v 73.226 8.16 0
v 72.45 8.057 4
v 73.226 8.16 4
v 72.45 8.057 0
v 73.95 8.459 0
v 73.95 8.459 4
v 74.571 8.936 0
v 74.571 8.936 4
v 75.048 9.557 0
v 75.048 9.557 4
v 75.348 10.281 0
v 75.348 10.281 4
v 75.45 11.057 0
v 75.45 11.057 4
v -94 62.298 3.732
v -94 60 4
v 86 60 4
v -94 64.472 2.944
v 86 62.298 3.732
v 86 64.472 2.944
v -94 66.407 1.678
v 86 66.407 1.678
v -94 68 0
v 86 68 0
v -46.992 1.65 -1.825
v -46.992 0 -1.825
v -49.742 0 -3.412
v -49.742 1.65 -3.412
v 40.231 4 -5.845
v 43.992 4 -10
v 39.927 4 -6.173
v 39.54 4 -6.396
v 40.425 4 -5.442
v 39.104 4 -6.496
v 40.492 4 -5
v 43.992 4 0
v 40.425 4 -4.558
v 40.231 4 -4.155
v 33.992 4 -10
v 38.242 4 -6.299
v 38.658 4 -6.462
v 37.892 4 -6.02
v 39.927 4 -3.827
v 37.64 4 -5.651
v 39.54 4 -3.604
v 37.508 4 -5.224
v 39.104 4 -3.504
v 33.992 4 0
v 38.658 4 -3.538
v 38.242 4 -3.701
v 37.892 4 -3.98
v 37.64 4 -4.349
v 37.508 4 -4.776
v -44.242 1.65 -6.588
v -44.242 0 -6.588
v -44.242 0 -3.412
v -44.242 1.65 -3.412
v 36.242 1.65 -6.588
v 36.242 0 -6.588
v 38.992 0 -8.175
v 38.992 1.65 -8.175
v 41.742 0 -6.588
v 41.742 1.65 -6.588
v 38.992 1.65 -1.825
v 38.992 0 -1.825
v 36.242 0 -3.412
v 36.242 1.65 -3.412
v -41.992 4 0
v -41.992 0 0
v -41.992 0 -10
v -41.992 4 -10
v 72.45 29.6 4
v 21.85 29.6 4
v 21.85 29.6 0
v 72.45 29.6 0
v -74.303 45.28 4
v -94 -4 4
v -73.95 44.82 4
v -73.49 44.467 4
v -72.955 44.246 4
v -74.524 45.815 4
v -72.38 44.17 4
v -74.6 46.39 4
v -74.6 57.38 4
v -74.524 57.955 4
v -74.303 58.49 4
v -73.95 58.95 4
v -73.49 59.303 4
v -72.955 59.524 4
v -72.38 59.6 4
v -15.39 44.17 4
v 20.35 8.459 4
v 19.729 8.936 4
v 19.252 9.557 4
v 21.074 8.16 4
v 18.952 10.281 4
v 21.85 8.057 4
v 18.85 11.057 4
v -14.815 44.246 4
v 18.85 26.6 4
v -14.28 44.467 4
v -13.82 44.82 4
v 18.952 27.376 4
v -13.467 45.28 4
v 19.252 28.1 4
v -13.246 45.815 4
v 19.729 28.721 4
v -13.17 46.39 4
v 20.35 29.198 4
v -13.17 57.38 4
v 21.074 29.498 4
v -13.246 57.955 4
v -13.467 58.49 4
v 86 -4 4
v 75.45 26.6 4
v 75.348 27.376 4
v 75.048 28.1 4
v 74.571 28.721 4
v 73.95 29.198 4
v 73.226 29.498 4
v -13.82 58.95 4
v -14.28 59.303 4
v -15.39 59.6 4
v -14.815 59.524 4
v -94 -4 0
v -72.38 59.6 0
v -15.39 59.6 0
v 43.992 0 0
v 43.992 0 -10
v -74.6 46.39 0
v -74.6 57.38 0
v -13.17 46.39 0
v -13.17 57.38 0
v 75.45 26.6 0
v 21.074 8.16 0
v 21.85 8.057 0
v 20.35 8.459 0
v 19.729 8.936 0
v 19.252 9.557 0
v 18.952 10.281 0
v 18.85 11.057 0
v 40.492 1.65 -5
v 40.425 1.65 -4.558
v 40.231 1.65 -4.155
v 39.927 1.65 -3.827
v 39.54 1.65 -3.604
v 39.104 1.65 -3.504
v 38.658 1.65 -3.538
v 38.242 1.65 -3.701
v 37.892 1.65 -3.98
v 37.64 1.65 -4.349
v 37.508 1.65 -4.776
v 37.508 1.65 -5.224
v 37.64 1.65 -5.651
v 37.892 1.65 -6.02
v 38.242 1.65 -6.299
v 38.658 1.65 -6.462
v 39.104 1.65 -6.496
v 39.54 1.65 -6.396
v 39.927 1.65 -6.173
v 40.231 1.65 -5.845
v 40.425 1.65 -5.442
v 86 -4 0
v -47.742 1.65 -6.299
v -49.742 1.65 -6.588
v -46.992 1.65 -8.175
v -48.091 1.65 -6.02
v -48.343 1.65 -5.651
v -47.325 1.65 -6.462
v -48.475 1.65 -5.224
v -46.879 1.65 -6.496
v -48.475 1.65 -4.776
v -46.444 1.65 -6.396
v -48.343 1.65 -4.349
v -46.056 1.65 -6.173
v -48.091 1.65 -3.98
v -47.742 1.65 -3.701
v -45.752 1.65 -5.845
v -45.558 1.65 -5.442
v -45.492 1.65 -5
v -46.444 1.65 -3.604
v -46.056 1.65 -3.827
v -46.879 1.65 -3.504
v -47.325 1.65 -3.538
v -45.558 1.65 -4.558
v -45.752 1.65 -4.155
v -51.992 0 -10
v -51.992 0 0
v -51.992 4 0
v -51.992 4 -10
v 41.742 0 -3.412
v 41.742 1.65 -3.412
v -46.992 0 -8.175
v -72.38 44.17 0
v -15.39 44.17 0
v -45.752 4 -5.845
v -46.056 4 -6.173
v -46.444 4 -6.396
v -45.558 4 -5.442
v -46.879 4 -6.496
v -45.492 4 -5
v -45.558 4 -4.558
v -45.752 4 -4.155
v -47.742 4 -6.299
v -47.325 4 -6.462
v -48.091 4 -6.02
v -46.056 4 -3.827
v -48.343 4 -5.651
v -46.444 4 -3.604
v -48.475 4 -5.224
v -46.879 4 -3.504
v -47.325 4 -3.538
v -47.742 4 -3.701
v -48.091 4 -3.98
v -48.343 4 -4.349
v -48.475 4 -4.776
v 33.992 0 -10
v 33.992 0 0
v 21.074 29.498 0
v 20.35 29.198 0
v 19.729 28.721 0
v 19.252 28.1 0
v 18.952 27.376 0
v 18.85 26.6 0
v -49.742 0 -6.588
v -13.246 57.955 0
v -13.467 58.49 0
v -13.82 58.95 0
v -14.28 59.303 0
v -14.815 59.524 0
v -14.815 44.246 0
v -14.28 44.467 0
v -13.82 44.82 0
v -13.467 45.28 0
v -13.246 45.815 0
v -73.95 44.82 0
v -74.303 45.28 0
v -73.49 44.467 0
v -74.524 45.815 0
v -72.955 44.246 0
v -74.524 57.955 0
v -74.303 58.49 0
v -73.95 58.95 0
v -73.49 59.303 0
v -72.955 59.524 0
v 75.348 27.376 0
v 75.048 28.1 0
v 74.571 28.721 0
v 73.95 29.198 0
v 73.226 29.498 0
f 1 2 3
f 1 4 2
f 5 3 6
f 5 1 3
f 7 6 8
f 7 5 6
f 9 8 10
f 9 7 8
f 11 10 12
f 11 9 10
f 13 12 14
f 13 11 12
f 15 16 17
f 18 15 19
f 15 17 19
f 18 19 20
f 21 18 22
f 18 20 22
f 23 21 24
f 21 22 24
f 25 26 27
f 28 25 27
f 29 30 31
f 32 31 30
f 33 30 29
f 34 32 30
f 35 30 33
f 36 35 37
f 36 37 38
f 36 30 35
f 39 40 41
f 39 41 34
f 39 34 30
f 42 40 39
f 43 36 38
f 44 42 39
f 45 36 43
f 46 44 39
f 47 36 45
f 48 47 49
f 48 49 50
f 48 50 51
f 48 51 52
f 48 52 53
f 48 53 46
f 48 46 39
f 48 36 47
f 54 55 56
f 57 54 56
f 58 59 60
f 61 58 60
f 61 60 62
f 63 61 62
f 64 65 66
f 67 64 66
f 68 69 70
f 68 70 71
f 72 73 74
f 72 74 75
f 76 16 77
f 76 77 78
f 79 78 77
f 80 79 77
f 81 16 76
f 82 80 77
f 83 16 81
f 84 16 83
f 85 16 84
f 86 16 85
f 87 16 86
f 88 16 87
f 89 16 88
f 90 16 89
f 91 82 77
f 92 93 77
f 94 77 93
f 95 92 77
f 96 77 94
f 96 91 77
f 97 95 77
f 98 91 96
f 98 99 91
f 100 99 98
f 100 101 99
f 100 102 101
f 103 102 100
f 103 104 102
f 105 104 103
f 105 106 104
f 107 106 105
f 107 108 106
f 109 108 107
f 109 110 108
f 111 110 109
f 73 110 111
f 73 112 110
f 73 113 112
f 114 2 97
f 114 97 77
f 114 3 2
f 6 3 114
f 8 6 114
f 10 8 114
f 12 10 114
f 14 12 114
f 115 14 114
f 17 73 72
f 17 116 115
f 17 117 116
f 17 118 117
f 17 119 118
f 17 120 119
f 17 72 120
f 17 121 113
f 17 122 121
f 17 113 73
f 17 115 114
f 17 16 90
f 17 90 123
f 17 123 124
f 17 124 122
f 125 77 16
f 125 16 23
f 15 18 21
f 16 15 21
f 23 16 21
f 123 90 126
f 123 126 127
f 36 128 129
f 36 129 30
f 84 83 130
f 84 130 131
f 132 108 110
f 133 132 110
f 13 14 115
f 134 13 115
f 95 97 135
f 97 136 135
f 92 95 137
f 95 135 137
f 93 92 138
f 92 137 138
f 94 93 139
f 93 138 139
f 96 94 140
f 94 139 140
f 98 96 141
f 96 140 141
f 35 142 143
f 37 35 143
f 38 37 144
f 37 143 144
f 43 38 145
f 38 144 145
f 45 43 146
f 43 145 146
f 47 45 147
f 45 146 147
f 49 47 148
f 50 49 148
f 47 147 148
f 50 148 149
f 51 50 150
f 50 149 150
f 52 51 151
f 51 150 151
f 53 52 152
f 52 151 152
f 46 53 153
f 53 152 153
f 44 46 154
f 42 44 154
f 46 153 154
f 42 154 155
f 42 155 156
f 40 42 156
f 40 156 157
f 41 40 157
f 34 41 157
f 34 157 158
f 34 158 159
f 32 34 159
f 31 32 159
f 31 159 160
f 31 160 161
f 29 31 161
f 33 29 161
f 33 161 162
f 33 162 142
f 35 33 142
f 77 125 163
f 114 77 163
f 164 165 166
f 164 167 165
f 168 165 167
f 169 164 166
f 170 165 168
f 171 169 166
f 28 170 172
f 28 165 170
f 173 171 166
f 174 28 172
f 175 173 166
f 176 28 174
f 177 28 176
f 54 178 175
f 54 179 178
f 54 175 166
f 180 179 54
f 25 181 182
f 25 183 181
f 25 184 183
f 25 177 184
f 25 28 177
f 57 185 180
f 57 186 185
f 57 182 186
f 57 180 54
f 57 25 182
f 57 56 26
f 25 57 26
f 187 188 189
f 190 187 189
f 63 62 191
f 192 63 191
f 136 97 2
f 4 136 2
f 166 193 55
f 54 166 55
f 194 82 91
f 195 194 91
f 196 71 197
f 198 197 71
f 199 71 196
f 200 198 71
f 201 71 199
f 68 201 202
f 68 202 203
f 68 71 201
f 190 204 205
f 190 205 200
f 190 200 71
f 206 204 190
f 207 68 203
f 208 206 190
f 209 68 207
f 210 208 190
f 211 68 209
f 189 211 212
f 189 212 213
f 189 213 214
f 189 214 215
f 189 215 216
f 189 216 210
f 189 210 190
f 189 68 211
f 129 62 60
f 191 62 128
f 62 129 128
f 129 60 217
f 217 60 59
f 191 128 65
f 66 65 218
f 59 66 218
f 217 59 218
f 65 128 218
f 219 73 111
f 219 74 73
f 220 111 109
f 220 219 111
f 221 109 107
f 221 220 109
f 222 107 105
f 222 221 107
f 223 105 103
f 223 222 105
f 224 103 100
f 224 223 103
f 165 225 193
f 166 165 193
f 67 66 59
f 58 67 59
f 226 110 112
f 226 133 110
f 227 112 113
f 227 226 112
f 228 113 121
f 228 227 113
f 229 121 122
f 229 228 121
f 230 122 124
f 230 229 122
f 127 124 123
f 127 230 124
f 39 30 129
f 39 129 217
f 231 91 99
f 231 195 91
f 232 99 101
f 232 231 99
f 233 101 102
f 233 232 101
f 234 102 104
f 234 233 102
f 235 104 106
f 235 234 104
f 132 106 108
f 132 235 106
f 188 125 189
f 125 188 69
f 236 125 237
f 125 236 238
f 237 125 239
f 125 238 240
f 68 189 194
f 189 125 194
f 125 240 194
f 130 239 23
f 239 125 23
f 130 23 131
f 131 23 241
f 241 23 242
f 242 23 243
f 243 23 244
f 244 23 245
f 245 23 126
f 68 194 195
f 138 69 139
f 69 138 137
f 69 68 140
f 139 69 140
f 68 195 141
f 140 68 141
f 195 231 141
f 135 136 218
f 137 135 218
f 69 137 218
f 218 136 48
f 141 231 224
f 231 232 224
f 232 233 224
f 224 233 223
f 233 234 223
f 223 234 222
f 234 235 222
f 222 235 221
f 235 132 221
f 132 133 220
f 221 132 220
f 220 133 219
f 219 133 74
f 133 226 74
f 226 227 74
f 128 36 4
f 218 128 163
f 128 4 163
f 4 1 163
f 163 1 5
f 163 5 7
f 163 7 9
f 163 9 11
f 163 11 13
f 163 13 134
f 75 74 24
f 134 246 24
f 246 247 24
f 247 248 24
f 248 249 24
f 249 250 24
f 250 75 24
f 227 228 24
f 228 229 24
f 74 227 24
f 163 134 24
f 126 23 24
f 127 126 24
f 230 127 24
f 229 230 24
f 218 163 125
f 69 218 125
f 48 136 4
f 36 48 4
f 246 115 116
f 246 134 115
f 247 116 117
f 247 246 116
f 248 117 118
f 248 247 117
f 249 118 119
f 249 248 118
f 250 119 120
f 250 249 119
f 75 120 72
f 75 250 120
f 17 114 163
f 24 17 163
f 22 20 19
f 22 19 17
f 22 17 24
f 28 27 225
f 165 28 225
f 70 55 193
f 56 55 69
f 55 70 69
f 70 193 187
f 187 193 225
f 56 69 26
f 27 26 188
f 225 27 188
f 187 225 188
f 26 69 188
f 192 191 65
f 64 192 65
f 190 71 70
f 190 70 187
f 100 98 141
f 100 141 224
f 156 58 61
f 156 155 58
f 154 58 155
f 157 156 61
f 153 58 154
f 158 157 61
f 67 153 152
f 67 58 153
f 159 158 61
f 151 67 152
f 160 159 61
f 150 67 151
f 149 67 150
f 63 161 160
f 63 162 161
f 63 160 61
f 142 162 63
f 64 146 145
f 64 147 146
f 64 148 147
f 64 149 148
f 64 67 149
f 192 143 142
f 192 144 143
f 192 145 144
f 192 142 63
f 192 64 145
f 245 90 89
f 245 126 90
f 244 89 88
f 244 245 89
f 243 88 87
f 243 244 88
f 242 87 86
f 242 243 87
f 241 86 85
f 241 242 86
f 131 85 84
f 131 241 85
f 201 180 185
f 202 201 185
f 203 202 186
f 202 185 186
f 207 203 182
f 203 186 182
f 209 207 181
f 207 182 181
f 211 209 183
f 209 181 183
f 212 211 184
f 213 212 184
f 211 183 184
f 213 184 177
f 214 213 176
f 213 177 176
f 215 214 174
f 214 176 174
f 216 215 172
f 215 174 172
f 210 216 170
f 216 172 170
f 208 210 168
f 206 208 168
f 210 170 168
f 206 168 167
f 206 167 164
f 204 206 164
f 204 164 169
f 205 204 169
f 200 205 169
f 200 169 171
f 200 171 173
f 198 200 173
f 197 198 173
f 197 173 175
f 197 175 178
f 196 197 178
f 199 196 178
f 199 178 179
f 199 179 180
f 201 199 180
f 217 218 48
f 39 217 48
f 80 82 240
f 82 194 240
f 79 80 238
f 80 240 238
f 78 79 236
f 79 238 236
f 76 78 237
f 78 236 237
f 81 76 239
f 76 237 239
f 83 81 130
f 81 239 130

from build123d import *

# Parameters (mm, degrees)
SALIENTE_EXTRUIR1_DEPTH = 4
CROQUIS2_W              = 10
CROQUIS2_H              = 4
SALIENTE_EXTRUIR2_DEPTH = 10
CROQUIS3_R              = 1.5
CORTAR_EXTRUIR1_DEPTH   = 10
CROQUIS3_3_R            = 1.5
CORTAR_EXTRUIR2_DEPTH   = 1.65
REDONDEO2_R             = 10
CORTAR_EXTRUIR4_REACH   = 121.7
CROQUIS4_W              = 14.4
CROQUIS4_H              = 16.36262465
CROQUIS4_W_2            = 16.3
CROQUIS4_H_2            = 13.9
CROQUIS4_W_3            = 15.3
CROQUIS4_H_3            = 16.22
CROQUIS5_W              = 56.6
CROQUIS5_H              = 21.54262465
CORTAR_EXTRUIR5_DEPTH   = 4
REDONDEO3_R             = 3
CROQUIS6_W              = 61.43
CROQUIS6_H              = 15.43
CORTAR_EXTRUIR6_DEPTH   = 4
REDONDEO4_R             = 2.22
CROQUIS8_W              = 4
CROQUIS8_H              = 72
CORTAR_EXTRUIR7_DEPTH   = 4


with BuildPart() as part:
    # Croquis1 → Saliente-Extruir1 (new body)
    with BuildSketch(Plane.XY):
        with BuildLine():
            Line((-98, 60), (-98, -4))
            Line((-98, -4), (90, -4))
            Line((90, -4), (90, 60))
            ThreePointArc((90, 60), (88.94427191, 64.472135955), (86, 68))
            Line((86, 68), (-94, 68))
            ThreePointArc((-94, 68), (-96.94427191, 64.472135955), (-98, 60))
        make_face()
    extrude(amount=SALIENTE_EXTRUIR1_DEPTH)

    # Croquis2 → Saliente-Extruir2 (add)
    with BuildSketch(Plane(origin=(0, 0, 0), x_dir=(-1, 0, 0), z_dir=(0, 0, -1))):
        with Locations((46.991549296, 2)):
            Rectangle(CROQUIS2_W, CROQUIS2_H)
        with Locations((-38.991549296, 2)):
            Rectangle(CROQUIS2_W, CROQUIS2_H)
    extrude(amount=SALIENTE_EXTRUIR2_DEPTH)

    # Croquis3 → Cortar-Extruir1 (cut)
    with BuildSketch(Plane.XZ):
        with Locations((38.991549296, -5)):
            Circle(CROQUIS3_R)
        with Locations((-46.991549296, -5)):
            Circle(CROQUIS3_R)
    extrude(amount=-CORTAR_EXTRUIR1_DEPTH, mode=Mode.SUBTRACT)

    # Croquis3<3> → Cortar-Extruir2 (cut)
    # profile 1 of 2: a face of its own
    with BuildSketch(Plane.XZ):
        Polygon((-46.991549296, -8.175426481), (-44.241549296, -6.58771324), (-44.241549296, -3.41228676), (-46.991549296, -1.824573519), (-49.741549296, -3.41228676), (-49.741549296, -6.58771324), align=None)
        with Locations((-46.991549296, -5)):
            Circle(CROQUIS3_3_R, mode=Mode.SUBTRACT)
    # profile 2 of 2: a face of its own
    with BuildSketch(Plane.XZ):
        Polygon((38.991549296, -8.175426481), (41.741549296, -6.58771324), (41.741549296, -3.41228676), (38.991549296, -1.824573519), (36.241549296, -3.41228676), (36.241549296, -6.58771324), align=None)
        with Locations((38.991549296, -5)):
            Circle(CROQUIS3_3_R, mode=Mode.SUBTRACT)
    extrude(amount=-CORTAR_EXTRUIR2_DEPTH, mode=Mode.SUBTRACT)

    # Redondeo2
    # the kernel refuses this fillet: 10 mm, written as the material it takes off along each edge
    with BuildSketch(Plane(origin=(106, 68, 4), x_dir=(0, -1, 0), z_dir=(-1, 0, 0))) as redondeo2_piece_1:
        with BuildLine():
            CenterArc((8, -10), REDONDEO2_R, 90, 53.130102354)
            Line((0, -4), (-0.16, -3.88))
            ThreePointArc((-0.16, -3.88), (-0.2, -2), (-0.2, 0))
            Line((-0.2, 0), (0, 0.2))
            Line((0, 0.2), (8, 0.2))
            Line((8, 0.2), (8, 0))
        make_face()
    extrude(amount=220, mode=Mode.SUBTRACT)

    # Croquis4 → Cortar-Extruir4 (cut, up to next)
    with BuildSketch(Plane(origin=(0, 0, 0), x_dir=(-1, 0, 0), z_dir=(0, 0, -1)), mode=Mode.PRIVATE) as cortar_extruir4_sk1:
        with Locations((-46.4, 18.238687675)):
            Rectangle(CROQUIS4_W, CROQUIS4_H)
    cortar_extruir4_tool1 = extrude(cortar_extruir4_sk1.sketch, amount=-CORTAR_EXTRUIR4_REACH, mode=Mode.PRIVATE) & part.part
    # Croquis4 → Cortar-Extruir4 (cut, up to next)
    with BuildSketch(Plane(origin=(0, 0, 0), x_dir=(-1, 0, 0), z_dir=(0, 0, -1)), mode=Mode.PRIVATE) as cortar_extruir4_sk2:
        with Locations((-65.3, 20.65)):
            Rectangle(CROQUIS4_W_2, CROQUIS4_H_2)
    cortar_extruir4_tool2 = extrude(cortar_extruir4_sk2.sketch, amount=-CORTAR_EXTRUIR4_REACH, mode=Mode.PRIVATE) & part.part
    # Croquis4 → Cortar-Extruir4 (cut, up to next)
    with BuildSketch(Plane(origin=(0, 0, 0), x_dir=(-1, 0, 0), z_dir=(0, 0, -1)), mode=Mode.PRIVATE) as cortar_extruir4_sk3:
        with Locations((-28.5, 19.49)):
            Rectangle(CROQUIS4_W_3, CROQUIS4_H_3)
    cortar_extruir4_tool3 = extrude(cortar_extruir4_sk3.sketch, amount=-CORTAR_EXTRUIR4_REACH, mode=Mode.PRIVATE) & part.part
    add(cortar_extruir4_tool1.solids().sort_by_distance((46.4, 18.238688, 0))[0], mode=Mode.SUBTRACT)
    add(cortar_extruir4_tool2.solids().sort_by_distance((65.3, 20.65, 0))[0], mode=Mode.SUBTRACT)
    add(cortar_extruir4_tool3.solids().sort_by_distance((28.5, 19.49, 0))[0], mode=Mode.SUBTRACT)

    # Croquis5 → Cortar-Extruir5 (cut)
    with BuildSketch(Plane.XY.offset(4)):
        with Locations((47.15, 18.828687675)):
            Rectangle(CROQUIS5_W, CROQUIS5_H)
    extrude(amount=-CORTAR_EXTRUIR5_DEPTH, mode=Mode.SUBTRACT)

    # Redondeo3
    redondeo3_edges = [part.edges().sort_by_distance(p)[0] for p in [
        (75.45, 29.6, 2),
        (75.45, 8.05737535, 2),
        (18.85, 8.05737535, 2),
        (18.85, 29.6, 2),
    ]]
    fillet(redondeo3_edges, radius=REDONDEO3_R)

    # Croquis6 → Cortar-Extruir6 (cut)
    with BuildSketch(Plane.XY.offset(4)):
        with Locations((-43.885, 51.885)):
            Rectangle(CROQUIS6_W, CROQUIS6_H)
    extrude(amount=-CORTAR_EXTRUIR6_DEPTH, mode=Mode.SUBTRACT)

    # Redondeo4
    redondeo4_edges = [part.edges().sort_by_distance(p)[0] for p in [
        (-13.17, 59.6, 2),
        (-13.17, 44.17, 2),
        (-74.6, 44.17, 2),
        (-74.6, 59.6, 2),
    ]]
    fillet(redondeo4_edges, radius=REDONDEO4_R)

    # Croquis8 → Cortar-Extruir7 (cut)
    with BuildSketch(Plane.XY.offset(4)):
        with Locations((88, 32)):
            Rectangle(CROQUIS8_W, CROQUIS8_H)
        with Locations((-96, 32)):
            Rectangle(CROQUIS8_W, CROQUIS8_H)
    extrude(amount=-CORTAR_EXTRUIR7_DEPTH, mode=Mode.SUBTRACT)


solid = part.part
